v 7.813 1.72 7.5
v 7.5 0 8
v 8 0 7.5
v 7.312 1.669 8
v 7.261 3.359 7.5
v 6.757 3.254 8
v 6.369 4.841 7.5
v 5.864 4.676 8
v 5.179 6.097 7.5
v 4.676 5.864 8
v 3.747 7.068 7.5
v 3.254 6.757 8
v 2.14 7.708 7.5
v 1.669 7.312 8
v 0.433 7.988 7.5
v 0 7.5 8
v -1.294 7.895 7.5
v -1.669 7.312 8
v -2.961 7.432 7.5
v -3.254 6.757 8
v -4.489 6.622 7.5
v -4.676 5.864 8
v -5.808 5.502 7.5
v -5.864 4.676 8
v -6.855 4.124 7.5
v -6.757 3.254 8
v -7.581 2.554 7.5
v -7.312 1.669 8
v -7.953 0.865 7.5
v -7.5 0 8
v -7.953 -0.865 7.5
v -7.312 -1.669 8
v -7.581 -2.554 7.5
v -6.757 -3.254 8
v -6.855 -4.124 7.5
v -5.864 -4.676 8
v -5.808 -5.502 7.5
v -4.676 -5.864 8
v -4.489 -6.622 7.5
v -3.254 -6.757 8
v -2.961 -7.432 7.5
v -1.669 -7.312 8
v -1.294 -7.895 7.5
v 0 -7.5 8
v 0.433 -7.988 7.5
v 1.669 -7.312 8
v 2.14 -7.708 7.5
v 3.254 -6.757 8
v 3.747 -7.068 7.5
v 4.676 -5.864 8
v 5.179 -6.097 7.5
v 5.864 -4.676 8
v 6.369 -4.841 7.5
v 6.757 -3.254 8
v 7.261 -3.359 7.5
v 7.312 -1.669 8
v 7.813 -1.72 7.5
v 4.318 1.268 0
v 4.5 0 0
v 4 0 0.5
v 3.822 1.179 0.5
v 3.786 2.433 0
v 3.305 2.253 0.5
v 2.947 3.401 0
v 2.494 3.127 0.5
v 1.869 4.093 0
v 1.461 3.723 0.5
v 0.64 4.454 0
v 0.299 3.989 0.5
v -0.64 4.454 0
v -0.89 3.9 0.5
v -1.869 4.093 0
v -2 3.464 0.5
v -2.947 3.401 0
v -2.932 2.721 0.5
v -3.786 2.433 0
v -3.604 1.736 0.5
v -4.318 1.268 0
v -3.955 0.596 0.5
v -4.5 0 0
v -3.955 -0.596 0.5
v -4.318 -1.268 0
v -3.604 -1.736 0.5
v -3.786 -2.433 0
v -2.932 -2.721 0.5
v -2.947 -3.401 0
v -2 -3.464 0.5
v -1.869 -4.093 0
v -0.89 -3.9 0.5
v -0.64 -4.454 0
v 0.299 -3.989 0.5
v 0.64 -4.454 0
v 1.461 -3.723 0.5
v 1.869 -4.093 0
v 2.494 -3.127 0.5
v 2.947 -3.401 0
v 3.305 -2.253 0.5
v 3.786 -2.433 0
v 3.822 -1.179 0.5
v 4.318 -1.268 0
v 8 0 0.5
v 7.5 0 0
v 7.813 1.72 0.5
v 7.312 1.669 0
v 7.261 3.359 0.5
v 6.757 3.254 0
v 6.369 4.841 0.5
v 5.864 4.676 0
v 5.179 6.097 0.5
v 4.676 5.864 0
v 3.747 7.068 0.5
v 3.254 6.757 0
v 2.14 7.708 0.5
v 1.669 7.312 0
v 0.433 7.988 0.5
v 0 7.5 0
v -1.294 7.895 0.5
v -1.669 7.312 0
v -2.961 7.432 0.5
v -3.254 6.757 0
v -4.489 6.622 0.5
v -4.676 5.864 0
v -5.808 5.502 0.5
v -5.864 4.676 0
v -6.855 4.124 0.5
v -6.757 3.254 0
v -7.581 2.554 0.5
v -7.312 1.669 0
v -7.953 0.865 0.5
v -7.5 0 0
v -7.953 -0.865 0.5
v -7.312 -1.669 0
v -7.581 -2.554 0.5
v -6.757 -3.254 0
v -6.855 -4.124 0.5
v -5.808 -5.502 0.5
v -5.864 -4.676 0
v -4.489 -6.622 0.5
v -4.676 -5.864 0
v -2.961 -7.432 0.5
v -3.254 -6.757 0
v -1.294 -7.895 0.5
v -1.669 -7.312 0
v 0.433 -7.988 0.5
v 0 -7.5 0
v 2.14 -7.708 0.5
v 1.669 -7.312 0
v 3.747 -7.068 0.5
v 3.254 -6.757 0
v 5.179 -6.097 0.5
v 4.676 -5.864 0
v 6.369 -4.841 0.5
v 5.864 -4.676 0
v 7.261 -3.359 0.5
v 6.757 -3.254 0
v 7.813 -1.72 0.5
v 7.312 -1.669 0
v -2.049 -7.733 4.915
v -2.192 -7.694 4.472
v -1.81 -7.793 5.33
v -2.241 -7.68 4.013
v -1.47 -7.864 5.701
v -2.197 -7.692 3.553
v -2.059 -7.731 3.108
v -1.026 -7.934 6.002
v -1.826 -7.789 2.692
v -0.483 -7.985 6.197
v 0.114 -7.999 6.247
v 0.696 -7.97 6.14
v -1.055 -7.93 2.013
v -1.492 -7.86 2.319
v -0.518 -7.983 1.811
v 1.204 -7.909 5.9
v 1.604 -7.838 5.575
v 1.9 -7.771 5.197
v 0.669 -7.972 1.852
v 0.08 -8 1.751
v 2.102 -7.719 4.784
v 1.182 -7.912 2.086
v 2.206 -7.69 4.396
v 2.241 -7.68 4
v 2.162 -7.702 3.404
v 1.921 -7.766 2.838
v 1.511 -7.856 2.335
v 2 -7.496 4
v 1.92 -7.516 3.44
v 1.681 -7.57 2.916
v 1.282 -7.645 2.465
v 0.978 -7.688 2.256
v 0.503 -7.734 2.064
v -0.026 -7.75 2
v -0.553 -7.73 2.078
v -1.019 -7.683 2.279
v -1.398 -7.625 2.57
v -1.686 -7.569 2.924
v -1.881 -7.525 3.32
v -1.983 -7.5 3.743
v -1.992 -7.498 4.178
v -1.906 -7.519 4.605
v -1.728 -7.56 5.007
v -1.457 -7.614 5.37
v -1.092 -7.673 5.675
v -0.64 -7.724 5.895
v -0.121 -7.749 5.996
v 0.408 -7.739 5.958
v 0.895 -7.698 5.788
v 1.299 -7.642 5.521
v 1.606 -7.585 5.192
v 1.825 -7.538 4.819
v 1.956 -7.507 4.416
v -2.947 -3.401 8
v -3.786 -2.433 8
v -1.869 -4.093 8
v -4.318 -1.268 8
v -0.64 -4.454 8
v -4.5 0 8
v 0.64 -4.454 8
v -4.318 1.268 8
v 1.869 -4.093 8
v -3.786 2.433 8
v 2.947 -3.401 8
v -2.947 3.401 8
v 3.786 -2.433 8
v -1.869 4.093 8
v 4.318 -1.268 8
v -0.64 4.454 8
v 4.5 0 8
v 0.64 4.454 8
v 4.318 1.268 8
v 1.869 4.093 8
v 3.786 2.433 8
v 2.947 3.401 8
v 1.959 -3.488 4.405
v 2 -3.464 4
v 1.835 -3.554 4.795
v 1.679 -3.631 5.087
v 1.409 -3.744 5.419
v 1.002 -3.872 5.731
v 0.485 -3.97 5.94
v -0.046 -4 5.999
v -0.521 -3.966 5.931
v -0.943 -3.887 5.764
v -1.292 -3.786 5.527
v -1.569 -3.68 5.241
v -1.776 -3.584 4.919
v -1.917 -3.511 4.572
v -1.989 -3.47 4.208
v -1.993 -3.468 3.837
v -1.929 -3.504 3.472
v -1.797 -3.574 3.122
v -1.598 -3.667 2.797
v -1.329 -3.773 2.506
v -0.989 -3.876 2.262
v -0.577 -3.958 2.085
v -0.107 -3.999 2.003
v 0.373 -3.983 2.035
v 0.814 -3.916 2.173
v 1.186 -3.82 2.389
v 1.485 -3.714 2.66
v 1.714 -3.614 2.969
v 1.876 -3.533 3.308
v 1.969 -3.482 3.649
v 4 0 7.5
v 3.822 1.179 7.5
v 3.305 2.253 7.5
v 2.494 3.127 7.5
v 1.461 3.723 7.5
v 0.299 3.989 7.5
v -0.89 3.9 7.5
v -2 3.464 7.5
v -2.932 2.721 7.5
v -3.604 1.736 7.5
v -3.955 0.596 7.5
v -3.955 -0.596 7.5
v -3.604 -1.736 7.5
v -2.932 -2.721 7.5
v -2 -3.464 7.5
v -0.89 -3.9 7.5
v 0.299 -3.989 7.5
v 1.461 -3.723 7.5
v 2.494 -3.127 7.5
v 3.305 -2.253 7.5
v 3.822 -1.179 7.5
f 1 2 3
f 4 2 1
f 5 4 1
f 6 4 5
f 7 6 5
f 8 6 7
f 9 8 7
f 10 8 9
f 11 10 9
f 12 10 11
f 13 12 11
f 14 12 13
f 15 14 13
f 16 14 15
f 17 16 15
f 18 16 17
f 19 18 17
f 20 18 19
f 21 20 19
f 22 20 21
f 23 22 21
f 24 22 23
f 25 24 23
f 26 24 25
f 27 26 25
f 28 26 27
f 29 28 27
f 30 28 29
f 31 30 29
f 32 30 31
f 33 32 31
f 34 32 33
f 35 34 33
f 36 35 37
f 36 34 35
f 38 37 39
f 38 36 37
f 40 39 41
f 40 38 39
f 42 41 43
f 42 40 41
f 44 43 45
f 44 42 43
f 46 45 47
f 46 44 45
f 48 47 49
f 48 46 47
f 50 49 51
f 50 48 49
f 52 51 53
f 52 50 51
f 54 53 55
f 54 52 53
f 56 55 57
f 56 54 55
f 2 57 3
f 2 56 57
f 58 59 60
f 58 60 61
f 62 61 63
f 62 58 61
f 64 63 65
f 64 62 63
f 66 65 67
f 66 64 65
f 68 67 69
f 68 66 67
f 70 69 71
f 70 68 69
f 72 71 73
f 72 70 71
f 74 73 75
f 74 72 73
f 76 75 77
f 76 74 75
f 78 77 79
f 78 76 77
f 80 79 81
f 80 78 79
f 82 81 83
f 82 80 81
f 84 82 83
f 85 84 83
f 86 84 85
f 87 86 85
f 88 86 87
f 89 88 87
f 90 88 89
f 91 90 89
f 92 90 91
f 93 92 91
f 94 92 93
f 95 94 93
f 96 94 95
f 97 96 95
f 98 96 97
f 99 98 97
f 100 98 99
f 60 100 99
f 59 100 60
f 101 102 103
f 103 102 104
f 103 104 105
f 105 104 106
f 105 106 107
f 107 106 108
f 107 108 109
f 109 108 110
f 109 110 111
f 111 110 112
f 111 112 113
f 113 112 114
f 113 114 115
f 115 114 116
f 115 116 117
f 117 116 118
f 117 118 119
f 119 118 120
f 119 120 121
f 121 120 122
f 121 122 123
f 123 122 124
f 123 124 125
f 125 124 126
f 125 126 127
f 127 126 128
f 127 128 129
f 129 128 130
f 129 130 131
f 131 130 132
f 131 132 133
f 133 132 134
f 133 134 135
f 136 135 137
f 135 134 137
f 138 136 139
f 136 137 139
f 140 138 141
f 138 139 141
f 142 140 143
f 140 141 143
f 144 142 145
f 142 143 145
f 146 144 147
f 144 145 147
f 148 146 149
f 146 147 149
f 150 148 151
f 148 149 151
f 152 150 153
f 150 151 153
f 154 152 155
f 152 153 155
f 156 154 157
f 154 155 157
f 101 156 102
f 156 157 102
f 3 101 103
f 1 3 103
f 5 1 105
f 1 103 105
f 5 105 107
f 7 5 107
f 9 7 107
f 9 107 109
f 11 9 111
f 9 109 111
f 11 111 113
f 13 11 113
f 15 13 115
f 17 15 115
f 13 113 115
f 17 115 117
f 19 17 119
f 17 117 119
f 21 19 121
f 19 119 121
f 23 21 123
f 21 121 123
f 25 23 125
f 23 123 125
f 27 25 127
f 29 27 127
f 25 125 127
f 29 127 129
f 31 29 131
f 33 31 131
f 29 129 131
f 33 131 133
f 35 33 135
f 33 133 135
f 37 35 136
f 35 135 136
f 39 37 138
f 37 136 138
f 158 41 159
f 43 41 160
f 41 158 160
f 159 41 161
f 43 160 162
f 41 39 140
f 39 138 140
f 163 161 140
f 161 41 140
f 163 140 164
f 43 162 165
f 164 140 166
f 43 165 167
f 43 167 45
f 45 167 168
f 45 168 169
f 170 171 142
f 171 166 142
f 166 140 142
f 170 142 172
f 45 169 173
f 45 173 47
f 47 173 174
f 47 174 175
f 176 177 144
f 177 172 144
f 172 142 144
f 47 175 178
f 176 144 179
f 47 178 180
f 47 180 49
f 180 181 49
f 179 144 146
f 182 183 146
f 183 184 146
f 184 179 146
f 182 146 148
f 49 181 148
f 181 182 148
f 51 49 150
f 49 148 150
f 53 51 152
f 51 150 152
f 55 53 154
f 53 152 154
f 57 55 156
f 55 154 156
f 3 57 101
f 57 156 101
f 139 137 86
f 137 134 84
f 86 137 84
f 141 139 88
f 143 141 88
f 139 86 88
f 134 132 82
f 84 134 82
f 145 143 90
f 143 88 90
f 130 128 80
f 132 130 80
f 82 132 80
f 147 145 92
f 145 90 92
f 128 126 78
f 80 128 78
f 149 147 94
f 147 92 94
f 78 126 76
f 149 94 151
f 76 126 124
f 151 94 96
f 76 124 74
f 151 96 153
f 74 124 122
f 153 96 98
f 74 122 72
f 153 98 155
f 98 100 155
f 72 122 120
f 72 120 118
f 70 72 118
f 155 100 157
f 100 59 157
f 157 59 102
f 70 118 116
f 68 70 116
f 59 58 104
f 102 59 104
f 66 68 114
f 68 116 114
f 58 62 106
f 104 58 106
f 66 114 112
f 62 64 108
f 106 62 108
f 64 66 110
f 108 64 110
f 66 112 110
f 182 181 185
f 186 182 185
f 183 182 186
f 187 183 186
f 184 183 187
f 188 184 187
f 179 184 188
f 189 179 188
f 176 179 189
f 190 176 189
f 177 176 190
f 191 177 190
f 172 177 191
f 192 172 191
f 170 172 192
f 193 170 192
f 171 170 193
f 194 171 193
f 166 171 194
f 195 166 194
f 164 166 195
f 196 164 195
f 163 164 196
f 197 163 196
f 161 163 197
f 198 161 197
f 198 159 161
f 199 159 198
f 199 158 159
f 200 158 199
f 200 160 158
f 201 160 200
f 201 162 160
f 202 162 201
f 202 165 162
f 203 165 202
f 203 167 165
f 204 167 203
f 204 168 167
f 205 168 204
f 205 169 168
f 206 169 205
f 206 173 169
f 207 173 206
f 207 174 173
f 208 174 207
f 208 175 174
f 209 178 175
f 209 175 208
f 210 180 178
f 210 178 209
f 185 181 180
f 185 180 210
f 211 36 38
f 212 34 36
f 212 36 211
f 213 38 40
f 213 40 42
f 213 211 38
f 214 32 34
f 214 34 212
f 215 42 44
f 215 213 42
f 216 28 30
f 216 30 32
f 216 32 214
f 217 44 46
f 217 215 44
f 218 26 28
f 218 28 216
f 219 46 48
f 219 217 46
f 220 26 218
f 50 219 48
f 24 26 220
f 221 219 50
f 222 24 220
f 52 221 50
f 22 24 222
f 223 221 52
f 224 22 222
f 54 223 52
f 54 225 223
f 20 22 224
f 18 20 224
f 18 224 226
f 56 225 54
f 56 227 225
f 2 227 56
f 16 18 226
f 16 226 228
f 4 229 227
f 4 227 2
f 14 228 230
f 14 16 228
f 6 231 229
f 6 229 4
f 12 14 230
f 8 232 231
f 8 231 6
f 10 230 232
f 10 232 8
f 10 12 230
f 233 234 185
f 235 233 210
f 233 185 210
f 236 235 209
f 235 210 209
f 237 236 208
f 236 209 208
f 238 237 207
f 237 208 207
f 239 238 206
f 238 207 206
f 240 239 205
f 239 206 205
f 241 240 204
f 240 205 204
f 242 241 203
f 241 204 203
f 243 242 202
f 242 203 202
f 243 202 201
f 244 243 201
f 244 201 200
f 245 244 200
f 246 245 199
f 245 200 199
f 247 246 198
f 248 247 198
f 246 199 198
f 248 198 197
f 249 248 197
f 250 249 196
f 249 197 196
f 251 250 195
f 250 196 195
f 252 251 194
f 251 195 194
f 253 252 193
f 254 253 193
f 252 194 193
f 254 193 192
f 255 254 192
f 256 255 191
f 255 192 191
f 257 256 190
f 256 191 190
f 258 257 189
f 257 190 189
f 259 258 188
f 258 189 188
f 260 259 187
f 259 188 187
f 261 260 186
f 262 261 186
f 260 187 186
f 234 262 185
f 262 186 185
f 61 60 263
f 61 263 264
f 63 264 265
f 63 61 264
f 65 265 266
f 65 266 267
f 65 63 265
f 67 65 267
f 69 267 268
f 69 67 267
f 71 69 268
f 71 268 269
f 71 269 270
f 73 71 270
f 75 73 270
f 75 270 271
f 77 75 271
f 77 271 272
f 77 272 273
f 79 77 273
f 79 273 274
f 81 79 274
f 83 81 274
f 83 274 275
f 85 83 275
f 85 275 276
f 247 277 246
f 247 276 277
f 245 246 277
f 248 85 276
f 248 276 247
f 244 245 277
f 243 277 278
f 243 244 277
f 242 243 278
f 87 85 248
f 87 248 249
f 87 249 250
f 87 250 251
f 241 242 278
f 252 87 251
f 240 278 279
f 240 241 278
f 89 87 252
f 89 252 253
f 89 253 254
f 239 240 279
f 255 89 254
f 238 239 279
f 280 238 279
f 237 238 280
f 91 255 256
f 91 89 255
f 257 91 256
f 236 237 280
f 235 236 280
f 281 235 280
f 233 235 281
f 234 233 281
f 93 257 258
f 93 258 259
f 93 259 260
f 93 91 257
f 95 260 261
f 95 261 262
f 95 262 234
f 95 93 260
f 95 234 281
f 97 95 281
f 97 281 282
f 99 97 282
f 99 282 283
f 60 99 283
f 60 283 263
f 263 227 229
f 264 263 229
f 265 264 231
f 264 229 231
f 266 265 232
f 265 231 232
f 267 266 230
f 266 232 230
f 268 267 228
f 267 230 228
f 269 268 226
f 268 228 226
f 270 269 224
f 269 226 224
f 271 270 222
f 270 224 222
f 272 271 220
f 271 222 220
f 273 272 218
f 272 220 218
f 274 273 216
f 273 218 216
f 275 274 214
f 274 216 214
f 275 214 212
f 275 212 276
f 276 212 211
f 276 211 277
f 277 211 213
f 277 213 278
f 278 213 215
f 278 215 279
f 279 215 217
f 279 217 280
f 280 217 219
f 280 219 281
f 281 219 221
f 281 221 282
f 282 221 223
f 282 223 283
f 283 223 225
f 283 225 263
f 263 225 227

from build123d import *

# Parameters (mm, degrees)
SKETCH_R        = 8
SKETCH_R_2      = 4
PAD_DEPTH       = 8
SKETCH001_R     = 2
HOLE_DEPTH      = 8
CHAMFER_SIZE    = 0.5
CHAMFER001_SIZE = 0.25


with BuildPart() as part:
    # Sketch → Pad (new body)
    with BuildSketch(Plane.XY):
        Circle(SKETCH_R)
        Circle(SKETCH_R_2, mode=Mode.SUBTRACT)
    extrude(amount=PAD_DEPTH)

    # Sketch001 → Hole (cut)
    with BuildSketch(Plane.XZ.offset(8)):
        with Locations((0, 4)):
            Circle(SKETCH001_R)
    extrude(amount=-HOLE_DEPTH, mode=Mode.SUBTRACT)

    # Chamfer
    chamfer_edges = [part.edges().sort_by_distance(p)[0] for p in [
        (-8, 0, 8),
        (-8, 0, 0),
        (-4, 0, 8),
        (-4, 0, 0),
    ]]
    chamfer(chamfer_edges, length=CHAMFER_SIZE)

    # Chamfer001
    chamfer001_edges = [part.edges().sort_by_distance(p)[0] for p in [
        (-1.414274, -7.873997, 2.585847),
        (-1.414274, -7.873997, 5.414153),
        (2, -7.745967, 4),
    ]]
    chamfer(chamfer001_edges, length=CHAMFER001_SIZE)


solid = part.part
